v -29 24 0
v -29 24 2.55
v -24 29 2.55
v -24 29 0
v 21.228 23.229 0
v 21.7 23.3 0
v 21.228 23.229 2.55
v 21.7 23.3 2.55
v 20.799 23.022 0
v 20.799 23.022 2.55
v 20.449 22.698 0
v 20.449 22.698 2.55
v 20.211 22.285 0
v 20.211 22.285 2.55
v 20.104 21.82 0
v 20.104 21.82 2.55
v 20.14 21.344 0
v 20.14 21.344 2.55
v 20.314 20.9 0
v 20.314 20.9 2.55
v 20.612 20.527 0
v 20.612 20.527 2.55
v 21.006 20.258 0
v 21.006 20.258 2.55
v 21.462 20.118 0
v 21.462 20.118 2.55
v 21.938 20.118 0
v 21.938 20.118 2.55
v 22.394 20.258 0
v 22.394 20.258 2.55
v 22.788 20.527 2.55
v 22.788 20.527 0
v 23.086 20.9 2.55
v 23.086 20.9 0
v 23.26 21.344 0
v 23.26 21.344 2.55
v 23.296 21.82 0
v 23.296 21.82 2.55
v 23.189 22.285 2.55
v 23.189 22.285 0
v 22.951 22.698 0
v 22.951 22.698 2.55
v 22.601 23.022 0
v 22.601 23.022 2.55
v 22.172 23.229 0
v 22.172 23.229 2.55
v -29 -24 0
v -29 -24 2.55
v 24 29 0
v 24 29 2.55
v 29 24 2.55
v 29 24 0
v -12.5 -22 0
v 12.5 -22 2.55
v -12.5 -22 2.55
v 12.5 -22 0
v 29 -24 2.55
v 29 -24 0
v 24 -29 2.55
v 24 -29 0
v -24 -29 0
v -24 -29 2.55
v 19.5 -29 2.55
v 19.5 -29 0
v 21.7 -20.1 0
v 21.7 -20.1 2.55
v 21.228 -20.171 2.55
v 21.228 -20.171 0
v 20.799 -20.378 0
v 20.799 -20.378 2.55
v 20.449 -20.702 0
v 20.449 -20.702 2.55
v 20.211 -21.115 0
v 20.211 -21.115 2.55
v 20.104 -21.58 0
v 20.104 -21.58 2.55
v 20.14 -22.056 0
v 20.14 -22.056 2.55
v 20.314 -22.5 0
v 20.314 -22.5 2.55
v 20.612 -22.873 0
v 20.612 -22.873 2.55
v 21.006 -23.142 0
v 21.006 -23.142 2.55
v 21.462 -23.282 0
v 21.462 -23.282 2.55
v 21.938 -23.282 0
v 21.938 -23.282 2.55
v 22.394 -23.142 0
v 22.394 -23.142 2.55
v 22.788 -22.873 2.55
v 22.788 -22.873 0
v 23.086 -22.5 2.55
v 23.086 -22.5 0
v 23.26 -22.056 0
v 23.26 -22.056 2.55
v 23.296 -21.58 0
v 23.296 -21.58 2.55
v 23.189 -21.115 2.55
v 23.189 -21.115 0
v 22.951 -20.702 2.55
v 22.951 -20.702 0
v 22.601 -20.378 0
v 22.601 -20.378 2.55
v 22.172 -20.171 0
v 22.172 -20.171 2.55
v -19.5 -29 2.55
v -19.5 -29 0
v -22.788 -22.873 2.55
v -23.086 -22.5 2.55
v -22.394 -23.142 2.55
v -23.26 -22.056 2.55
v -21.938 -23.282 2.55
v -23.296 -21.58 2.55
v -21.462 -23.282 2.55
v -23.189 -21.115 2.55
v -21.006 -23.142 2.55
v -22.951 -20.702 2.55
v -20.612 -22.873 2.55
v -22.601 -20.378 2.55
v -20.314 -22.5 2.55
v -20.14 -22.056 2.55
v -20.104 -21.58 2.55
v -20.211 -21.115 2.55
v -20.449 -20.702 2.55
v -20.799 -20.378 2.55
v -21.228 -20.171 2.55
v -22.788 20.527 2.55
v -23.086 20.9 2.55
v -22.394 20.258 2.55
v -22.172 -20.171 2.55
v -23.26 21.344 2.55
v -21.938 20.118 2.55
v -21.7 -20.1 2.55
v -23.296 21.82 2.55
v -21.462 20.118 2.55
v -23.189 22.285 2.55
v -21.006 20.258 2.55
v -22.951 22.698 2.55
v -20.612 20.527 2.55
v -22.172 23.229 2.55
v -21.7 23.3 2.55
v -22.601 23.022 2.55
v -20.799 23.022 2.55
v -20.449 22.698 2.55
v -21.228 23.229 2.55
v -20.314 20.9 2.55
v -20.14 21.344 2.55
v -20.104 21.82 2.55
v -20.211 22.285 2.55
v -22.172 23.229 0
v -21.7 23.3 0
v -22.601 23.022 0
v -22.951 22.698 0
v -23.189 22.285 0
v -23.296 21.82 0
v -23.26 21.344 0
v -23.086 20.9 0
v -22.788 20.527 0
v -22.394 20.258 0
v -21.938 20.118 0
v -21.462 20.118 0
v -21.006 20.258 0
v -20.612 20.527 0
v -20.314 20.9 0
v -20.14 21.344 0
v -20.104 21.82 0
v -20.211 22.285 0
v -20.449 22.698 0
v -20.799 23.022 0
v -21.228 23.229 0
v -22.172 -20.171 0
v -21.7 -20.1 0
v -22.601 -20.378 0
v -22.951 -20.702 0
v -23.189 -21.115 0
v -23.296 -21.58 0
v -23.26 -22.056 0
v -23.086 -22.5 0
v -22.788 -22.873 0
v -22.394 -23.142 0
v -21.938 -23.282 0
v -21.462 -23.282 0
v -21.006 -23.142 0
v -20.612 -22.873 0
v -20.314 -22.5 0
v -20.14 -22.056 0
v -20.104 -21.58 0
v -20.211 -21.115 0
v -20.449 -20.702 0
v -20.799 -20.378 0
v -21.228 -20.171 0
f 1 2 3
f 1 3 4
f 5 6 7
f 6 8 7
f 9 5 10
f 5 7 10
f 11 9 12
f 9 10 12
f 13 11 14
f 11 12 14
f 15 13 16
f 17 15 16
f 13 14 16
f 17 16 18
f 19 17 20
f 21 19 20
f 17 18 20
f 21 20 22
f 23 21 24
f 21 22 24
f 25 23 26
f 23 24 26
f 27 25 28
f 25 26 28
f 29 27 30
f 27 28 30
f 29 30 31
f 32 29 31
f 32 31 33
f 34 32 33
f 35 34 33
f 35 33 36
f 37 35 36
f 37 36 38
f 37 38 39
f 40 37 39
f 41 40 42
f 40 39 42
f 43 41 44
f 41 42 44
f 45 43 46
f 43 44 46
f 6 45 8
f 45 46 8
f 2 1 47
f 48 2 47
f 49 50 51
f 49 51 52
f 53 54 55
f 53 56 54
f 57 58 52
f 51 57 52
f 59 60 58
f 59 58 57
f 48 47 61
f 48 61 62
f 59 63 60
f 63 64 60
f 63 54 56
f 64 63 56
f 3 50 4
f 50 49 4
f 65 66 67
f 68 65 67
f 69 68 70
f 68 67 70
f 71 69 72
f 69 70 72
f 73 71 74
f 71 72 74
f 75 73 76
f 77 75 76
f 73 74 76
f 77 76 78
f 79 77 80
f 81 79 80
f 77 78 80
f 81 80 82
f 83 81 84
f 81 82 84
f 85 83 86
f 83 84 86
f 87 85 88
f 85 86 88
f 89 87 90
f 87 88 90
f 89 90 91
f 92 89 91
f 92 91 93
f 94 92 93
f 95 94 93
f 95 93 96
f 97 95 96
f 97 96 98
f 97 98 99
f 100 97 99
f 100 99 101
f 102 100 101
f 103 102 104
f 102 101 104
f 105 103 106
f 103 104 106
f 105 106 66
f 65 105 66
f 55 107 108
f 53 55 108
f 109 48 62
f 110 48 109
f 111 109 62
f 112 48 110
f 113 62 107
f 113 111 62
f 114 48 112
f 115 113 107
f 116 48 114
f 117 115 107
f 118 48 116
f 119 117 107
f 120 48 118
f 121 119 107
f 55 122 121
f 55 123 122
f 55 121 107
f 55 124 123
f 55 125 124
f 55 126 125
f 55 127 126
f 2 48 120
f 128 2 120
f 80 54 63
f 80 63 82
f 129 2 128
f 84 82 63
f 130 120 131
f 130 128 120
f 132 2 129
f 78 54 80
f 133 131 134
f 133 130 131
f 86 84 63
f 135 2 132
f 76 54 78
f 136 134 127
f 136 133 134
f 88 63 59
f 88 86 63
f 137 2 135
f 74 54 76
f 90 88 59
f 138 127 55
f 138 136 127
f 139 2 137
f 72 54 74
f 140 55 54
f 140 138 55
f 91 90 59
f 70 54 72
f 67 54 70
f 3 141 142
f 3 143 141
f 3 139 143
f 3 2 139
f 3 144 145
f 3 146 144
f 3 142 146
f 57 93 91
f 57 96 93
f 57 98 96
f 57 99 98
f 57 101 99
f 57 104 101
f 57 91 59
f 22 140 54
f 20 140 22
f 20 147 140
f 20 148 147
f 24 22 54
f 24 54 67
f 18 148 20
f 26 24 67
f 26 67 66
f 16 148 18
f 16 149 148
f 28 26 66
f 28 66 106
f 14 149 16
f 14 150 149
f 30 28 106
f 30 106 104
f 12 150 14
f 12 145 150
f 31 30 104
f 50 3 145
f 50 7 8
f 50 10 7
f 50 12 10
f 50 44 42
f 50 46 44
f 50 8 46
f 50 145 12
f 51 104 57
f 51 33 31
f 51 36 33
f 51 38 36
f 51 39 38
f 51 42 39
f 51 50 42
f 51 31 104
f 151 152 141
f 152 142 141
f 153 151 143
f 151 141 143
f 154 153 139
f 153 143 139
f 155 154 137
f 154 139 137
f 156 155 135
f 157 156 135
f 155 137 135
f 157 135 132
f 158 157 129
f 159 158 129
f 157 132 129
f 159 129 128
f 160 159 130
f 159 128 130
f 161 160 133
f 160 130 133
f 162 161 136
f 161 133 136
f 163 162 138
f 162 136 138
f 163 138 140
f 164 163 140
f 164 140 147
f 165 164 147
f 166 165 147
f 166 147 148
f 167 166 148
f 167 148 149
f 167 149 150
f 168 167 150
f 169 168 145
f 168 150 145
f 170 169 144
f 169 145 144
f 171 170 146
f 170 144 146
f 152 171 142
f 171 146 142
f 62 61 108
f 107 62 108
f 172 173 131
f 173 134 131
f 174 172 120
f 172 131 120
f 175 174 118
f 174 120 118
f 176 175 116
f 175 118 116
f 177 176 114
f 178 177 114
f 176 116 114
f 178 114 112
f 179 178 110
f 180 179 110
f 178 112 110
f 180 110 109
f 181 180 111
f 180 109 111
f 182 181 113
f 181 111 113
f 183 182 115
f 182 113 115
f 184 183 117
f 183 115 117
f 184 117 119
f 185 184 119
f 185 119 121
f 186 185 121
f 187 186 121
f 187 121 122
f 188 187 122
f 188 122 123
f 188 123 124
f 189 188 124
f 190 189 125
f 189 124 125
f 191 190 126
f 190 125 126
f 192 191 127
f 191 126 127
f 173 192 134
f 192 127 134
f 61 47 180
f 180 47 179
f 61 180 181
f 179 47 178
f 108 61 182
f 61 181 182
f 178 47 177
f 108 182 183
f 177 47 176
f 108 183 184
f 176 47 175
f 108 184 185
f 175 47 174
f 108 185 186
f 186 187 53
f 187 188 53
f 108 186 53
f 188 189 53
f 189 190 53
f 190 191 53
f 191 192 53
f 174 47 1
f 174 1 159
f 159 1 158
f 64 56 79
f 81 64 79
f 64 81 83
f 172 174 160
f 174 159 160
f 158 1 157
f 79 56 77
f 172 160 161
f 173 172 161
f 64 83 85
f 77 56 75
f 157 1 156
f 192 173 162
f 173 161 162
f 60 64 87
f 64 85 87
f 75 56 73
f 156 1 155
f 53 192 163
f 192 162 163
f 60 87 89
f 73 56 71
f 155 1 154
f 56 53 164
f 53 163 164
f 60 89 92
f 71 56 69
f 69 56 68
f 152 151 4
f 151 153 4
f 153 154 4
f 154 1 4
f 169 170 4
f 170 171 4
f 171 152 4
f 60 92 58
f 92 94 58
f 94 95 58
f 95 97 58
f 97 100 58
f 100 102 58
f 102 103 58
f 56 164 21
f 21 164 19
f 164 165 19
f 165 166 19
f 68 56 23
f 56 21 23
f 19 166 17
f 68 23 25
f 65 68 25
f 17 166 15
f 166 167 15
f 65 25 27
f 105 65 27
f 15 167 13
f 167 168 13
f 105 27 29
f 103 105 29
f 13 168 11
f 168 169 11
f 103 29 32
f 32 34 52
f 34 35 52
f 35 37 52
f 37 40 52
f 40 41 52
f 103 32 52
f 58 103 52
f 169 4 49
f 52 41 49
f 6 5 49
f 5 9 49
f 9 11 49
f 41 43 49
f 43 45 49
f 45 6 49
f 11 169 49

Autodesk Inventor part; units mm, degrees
ref_plane "YZ Plane" through (0, 0, 0) normal (1, 0, 0) x (0, 1, 0)
ref_plane "XZ Plane" through (0, 0, 0) normal (0, 1, 0) x (-1, 0, 0)
ref_plane "XY Plane" through (0, 0, 0) normal (0, 0, 1) x (1, 0, 0)
sketch "Sketch1" plane through (0, 0, 0) normal (0, 0, 1) x (1, 0, 0)
  line L0 (29, 29) -> (-29, 29)
  line L1 (-29, 29) -> (-29, -29)
  line L2 (-29, -29) -> (29, -29)
  line L3 (29, -29) -> (29, 29)
  line L4 (29, 29) -> (-29, -29) construction
  line L5 (-29, 29) -> (29, -29) construction
  line L6 (21.7, -21.7) -> (-21.7, -21.7) construction
  line L7 (-21.7, -21.7) -> (-21.7, 21.7) construction
  line L8 (-21.7, 21.7) -> (21.7, 21.7) construction
  line L9 (21.7, 21.7) -> (21.7, -21.7) construction
  line L10 (21.7, -21.7) -> (-21.7, 21.7) construction
  line L11 (-21.7, -21.7) -> (21.7, 21.7) construction
  line L12 (-12.5, -36) -> (12.5, -36)
  line L13 (12.5, -36) -> (12.5, -22)
  line L14 (12.5, -22) -> (-12.5, -22)
  line L15 (-12.5, -22) -> (-12.5, -36)
  line L16 (-12.5, -36) -> (12.5, -22) construction
  line L17 (12.5, -36) -> (-12.5, -22) construction
  point P0 (0, 0)
  point P1 (0, -29)
  dimension "d0" = 58
  dimension "d1" = 58
  dimension "d7" = 43.4
  dimension "d15" = 25
  dimension "d16" = 14
extrude "Extrusion1" add sketch "Sketch1" along normal blind 2.55 contours L3 L2 L13 L14 L15 L1 L0 | L2 L15 L14 L13
chamfer "Chamfer1" distance 5 angle 45 4 edges at (29, 29, 1.275) (-29, 29, 1.275) (-29, -29, 1.275) (29, -29, 1.275)
hole "Hole1" at (-21.7, 21.7, 0) at (-21.7, -21.7, 0) at (21.7, -21.7, 0) at (21.7, 21.7, 0) direction (0, 0, 1) diameter 3.2 end through all
extrude "Extrusion2" cut sketch "Sketch1" along normal up to next contours L13 L12 L15 L2 | L2 L15 L14 L13
chamfer "Chamfer2" distance 7 angle 45 2 edges at (-12.5, -29, 1.275) (12.5, -29, 1.275)
sketch "Sketch2" plane through (0, 0, 2.55) normal (0, 0, 1) x (1, 0, 0)
  line L0 (19.5, -29) -> (12.5, -22) projected
  line L1 (19.5, -29) -> (24, -29) projected
  line L2 (29, -24) -> (24, -29) projected
  line L3 (29, -24) -> (29, 24) projected
  line L4 (24, 29) -> (29, 24) projected
  line L5 (24, 29) -> (-24, 29) projected
  line L6 (-29, 24) -> (-24, 29) projected
  line L7 (-29, 24) -> (-29, -24) projected
  line L8 (-24, -29) -> (-29, -24) projected
  line L9 (-24, -29) -> (-19.5, -29) projected
  line L10 (-12.5, -22) -> (-19.5, -29) projected
  line L11 (-12.5, -22) -> (12.5, -22) projected
  circle A0 centre (21.7, 21.7) radius 1.6 projected
  circle A1 centre (-21.7, -21.7) radius 1.6 projected
  circle A2 centre (-21.7, 21.7) radius 1.6 projected
  circle A3 centre (21.7, -21.7) radius 1.6 projected
  point P0 (0, 0)
properties part number "compactActiveLoad_BottomCover"
